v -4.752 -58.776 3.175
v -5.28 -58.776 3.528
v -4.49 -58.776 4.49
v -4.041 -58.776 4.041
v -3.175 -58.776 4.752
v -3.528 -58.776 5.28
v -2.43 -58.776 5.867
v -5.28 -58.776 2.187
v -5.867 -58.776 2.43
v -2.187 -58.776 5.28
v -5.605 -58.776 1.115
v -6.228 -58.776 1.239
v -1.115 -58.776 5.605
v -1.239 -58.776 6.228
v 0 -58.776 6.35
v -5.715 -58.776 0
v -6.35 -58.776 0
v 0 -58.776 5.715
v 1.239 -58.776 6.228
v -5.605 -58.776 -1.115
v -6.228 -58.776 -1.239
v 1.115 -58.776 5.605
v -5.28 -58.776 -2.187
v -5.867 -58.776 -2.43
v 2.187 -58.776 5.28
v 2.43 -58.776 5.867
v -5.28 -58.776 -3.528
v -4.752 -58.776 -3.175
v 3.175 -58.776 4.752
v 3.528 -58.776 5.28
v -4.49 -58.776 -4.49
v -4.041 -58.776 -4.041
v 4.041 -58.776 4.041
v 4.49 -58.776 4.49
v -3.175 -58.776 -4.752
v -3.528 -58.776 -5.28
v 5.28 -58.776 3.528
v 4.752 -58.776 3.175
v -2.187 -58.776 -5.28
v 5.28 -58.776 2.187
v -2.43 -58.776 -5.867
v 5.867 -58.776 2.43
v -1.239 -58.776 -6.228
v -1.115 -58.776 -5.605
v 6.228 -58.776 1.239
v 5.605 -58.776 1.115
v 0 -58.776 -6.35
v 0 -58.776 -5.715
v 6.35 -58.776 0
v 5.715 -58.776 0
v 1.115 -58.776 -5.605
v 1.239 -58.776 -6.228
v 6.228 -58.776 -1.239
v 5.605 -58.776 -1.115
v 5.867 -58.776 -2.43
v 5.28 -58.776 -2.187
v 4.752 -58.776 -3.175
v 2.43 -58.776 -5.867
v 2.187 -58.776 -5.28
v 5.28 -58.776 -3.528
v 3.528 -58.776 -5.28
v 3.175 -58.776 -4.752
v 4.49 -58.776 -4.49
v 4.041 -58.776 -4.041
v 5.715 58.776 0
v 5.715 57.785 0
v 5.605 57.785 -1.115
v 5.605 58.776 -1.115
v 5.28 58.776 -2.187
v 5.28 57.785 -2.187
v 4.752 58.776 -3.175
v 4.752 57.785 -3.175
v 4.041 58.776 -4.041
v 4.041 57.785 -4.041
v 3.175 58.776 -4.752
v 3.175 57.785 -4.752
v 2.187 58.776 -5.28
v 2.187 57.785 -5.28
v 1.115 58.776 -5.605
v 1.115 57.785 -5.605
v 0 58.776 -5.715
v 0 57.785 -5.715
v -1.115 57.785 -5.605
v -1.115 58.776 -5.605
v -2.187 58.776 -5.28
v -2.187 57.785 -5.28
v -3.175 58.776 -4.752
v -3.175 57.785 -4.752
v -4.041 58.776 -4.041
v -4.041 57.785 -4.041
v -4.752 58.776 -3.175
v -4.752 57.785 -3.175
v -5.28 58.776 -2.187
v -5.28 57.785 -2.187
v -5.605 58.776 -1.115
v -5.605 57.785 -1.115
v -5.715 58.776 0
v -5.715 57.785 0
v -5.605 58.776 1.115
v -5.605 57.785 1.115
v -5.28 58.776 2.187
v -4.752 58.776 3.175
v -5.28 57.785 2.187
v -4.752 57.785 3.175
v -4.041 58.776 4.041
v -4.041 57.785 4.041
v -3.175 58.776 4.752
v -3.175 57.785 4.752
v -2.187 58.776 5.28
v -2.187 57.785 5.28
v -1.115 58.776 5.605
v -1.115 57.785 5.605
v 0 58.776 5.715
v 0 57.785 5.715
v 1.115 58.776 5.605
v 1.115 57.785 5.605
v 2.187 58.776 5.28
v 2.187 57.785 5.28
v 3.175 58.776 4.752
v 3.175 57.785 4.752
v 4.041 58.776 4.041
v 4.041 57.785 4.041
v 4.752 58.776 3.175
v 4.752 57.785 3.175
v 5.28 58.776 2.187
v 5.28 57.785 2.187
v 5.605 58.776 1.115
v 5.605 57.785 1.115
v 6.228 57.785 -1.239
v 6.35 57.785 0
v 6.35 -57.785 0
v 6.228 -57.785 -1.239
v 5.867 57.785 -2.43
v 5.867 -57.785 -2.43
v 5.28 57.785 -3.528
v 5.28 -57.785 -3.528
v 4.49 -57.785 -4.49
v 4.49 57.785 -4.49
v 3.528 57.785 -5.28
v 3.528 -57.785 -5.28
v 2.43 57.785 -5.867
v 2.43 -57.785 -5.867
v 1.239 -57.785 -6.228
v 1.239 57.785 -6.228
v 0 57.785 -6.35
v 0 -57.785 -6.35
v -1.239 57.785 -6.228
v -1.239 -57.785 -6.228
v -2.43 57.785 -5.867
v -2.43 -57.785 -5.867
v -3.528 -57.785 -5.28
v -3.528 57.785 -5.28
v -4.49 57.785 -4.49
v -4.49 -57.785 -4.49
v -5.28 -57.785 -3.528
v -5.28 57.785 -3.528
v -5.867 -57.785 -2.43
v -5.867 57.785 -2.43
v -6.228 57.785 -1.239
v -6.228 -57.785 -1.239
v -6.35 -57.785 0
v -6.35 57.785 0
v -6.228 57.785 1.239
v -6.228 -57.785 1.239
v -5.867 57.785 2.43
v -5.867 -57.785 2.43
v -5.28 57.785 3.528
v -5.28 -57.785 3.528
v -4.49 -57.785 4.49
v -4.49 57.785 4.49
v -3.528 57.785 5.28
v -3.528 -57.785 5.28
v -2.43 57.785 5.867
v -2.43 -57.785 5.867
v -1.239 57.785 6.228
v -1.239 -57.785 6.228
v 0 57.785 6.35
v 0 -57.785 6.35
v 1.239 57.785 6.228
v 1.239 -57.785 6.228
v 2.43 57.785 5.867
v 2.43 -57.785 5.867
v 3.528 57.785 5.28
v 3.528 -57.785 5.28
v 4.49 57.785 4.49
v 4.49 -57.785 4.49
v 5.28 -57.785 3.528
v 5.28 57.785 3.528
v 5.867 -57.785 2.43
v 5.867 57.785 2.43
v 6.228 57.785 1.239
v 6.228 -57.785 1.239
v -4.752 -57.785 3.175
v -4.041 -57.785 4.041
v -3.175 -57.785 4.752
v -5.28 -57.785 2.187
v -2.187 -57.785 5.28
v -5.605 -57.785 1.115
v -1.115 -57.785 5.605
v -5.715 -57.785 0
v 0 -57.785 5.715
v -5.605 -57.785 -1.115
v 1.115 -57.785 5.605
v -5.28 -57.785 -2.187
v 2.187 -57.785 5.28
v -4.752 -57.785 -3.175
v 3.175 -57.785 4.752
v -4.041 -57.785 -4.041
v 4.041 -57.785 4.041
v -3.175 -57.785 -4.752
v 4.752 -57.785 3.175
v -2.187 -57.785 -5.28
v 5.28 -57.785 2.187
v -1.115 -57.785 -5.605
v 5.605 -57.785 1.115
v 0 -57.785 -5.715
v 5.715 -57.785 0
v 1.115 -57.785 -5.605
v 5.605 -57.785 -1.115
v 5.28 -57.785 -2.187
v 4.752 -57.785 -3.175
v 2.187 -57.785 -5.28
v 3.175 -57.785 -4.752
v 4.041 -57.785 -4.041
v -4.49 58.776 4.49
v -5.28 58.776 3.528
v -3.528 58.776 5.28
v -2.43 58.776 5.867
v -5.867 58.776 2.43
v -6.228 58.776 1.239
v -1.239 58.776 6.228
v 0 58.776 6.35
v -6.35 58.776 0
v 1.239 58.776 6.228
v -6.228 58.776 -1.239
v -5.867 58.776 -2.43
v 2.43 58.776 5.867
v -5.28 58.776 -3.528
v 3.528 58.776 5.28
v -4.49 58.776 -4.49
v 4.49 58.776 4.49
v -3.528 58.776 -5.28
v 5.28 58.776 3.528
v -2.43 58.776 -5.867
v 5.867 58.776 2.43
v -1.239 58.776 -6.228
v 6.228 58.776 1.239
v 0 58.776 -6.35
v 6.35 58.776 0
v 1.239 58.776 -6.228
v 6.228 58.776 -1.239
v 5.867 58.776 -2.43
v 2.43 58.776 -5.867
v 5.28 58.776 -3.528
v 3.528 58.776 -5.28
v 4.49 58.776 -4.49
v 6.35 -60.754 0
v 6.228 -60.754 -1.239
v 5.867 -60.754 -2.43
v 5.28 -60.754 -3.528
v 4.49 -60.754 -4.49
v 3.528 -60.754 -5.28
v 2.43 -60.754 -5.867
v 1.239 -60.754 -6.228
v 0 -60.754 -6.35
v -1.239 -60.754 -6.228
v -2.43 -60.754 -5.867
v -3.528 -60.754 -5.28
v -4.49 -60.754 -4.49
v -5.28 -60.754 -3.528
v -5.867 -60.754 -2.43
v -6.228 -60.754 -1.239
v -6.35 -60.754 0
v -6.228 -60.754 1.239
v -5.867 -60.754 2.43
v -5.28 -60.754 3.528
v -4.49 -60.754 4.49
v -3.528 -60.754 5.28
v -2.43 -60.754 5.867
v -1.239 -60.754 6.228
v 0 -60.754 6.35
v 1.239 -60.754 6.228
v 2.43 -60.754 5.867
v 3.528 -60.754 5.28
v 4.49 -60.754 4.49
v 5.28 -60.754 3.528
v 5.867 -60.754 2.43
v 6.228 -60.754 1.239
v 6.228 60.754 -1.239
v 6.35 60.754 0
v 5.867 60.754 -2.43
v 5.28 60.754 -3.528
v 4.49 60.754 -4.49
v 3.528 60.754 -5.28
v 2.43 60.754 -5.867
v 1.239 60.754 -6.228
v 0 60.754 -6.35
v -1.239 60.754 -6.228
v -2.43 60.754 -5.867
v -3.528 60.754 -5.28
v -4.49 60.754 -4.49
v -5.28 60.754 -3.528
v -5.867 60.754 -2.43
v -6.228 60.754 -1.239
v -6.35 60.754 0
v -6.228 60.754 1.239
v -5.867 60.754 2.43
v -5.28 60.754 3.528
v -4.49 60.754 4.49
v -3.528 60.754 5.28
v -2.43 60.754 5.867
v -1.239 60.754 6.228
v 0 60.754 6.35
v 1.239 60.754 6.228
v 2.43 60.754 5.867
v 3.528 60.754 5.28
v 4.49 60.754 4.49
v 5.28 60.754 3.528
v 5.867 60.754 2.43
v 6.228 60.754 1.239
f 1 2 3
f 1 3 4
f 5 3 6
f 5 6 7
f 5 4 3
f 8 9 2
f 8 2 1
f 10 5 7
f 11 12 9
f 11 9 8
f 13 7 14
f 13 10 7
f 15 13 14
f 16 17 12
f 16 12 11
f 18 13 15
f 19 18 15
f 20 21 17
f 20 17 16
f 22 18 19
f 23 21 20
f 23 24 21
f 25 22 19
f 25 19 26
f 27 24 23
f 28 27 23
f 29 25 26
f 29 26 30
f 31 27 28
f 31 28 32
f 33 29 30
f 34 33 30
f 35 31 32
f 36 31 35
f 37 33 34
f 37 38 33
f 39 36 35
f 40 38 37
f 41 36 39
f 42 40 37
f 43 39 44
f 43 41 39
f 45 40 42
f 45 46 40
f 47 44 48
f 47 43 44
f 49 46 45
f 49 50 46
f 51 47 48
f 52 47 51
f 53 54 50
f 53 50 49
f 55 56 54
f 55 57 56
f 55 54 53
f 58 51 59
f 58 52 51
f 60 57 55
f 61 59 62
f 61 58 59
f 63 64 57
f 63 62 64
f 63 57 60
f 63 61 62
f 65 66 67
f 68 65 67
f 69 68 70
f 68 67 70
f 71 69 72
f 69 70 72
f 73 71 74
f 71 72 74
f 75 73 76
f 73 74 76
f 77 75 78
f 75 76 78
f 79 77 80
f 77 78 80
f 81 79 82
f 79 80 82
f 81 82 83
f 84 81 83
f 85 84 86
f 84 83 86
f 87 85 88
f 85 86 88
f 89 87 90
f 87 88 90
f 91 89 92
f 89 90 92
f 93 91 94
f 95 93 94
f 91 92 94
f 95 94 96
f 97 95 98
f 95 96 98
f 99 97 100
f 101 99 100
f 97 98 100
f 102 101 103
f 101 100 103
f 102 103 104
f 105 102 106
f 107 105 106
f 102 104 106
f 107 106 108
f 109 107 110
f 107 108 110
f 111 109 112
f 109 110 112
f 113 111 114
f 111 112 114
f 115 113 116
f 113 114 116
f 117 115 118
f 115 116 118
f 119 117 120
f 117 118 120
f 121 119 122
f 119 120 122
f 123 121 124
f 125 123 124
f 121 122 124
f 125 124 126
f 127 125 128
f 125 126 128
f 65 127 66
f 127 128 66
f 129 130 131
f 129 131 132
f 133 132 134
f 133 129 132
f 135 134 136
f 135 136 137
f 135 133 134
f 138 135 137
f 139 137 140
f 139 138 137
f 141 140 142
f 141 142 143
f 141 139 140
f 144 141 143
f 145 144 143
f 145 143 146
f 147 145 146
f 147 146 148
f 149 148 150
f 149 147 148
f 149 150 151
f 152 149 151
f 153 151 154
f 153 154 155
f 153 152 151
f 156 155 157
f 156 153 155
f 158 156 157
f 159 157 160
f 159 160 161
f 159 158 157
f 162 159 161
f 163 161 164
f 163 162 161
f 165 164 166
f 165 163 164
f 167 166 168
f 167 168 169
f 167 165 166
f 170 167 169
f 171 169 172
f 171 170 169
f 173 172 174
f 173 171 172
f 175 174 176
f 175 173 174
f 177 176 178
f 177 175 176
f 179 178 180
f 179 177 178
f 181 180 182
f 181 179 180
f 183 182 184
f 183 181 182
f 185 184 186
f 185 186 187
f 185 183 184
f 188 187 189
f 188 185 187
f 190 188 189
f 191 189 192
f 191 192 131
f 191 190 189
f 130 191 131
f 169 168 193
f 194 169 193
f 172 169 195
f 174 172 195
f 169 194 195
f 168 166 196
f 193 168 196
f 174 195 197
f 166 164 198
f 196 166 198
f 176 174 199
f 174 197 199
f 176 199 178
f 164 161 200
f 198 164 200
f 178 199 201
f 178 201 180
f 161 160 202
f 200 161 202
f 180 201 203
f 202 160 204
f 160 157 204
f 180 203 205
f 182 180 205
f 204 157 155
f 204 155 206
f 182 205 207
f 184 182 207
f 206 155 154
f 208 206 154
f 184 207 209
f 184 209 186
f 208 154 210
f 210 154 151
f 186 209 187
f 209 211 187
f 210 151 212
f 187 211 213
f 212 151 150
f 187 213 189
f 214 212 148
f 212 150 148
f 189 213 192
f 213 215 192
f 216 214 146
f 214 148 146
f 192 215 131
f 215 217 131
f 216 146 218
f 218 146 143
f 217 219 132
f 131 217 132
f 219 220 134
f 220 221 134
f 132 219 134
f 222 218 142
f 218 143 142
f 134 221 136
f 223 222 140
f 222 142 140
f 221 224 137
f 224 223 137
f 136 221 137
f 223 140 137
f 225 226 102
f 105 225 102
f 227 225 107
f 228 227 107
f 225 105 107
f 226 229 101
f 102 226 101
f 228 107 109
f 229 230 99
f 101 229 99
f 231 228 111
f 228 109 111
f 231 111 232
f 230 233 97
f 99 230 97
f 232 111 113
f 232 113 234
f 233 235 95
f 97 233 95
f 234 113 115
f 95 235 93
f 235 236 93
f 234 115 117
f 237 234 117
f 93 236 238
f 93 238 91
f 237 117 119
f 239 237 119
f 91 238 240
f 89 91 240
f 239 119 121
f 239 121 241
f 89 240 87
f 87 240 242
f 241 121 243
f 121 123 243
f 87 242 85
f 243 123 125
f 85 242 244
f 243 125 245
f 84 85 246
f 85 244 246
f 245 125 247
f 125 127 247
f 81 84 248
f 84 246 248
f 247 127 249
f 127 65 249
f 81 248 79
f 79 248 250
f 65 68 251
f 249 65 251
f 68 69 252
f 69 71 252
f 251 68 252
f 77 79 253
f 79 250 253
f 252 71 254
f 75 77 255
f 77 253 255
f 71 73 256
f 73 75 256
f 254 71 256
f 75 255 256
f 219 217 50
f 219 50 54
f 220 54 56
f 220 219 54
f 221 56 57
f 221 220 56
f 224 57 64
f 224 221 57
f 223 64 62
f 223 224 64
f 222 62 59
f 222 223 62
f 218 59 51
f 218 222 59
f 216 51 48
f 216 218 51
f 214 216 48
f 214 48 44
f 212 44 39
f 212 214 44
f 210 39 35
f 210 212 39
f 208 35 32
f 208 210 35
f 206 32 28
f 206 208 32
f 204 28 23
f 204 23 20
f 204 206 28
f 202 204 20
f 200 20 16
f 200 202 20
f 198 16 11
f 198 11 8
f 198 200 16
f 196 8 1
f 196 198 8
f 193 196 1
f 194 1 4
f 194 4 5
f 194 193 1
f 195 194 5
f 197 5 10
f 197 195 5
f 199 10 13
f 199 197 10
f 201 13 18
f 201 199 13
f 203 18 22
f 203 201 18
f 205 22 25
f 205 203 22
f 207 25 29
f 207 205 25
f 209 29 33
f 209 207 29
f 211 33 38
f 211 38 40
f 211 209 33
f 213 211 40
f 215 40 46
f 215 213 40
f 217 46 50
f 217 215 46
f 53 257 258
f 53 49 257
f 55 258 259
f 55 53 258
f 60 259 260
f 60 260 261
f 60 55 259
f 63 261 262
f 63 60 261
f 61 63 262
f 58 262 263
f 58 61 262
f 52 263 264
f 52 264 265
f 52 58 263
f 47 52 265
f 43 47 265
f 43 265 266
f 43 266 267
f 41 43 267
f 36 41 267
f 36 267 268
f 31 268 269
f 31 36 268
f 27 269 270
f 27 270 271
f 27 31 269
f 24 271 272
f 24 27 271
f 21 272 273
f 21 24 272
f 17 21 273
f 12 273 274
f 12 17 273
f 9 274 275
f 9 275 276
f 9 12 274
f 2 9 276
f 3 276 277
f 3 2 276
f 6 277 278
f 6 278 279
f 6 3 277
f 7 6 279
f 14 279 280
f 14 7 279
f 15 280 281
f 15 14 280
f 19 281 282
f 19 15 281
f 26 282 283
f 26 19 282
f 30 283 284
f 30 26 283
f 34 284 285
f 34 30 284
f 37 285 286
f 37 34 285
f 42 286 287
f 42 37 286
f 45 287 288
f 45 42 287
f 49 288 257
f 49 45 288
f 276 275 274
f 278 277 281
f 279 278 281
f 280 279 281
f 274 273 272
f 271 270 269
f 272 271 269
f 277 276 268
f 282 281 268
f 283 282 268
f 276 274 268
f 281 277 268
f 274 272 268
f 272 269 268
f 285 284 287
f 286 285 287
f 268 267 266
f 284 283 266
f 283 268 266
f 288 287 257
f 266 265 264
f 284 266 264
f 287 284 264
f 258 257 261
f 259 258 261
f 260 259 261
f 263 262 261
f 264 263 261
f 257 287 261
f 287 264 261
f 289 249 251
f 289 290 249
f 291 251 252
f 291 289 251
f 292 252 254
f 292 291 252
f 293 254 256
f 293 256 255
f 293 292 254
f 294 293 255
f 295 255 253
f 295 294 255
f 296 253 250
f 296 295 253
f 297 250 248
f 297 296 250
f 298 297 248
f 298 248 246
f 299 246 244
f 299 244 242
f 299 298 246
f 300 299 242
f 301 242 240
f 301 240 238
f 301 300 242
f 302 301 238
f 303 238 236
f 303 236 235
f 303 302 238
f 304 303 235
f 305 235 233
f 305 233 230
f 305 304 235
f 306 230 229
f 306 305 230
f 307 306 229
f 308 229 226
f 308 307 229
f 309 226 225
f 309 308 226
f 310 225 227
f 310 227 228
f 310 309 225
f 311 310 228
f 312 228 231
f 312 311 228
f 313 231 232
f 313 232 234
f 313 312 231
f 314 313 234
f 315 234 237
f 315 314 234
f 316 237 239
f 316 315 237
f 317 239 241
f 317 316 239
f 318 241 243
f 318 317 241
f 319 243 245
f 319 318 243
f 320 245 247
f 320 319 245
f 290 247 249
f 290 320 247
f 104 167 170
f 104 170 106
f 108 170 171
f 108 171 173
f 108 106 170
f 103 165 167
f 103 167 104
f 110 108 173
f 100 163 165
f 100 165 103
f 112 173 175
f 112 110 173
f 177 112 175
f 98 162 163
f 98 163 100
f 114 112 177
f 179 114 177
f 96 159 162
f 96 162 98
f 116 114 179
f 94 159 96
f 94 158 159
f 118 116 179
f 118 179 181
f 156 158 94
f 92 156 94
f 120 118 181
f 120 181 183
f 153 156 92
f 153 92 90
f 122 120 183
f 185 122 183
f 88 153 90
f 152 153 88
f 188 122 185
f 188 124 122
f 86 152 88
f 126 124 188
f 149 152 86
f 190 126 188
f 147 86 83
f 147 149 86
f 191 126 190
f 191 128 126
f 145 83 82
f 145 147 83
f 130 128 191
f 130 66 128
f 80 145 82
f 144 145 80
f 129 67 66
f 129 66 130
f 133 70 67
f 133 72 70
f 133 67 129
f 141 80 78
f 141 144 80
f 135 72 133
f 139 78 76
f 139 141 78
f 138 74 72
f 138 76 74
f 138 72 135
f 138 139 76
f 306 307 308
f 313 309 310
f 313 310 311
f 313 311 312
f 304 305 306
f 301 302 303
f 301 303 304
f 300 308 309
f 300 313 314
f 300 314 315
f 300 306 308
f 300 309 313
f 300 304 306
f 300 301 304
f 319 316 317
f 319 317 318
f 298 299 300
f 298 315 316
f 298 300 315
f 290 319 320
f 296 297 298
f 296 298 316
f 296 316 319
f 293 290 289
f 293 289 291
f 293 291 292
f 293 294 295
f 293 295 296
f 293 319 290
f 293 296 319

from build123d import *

# Parameters (mm, degrees)
SKETCH1_R           = 6.35
SKETCH1_R_2         = 3.175
BOSS_EXTRUDE1_DEPTH = 59.69
CUT_EXTRUDE1_START  = 1.905
SKETCH2_R           = 6.35
SKETCH2_R_2         = 5.715
CUT_EXTRUDE1_DEPTH  = 0.9906
SKETCH3_R           = 6.35
BOSS_EXTRUDE2_DEPTH = 1.064499902


with BuildPart() as part:
    # Sketch1 → Boss-Extrude1 (new body, symmetric)
    with BuildSketch(Plane(origin=(0, 0, 0), x_dir=(1, 0, 0), z_dir=(0, 1, 0))):
        Circle(SKETCH1_R)
        Circle(SKETCH1_R_2, mode=Mode.SUBTRACT)
        Circle(SKETCH1_R_2)
    extrude(amount=BOSS_EXTRUDE1_DEPTH, both=True)

    # Sketch2 → Cut-Extrude1 (cut)
    with BuildSketch(Plane(origin=(0, -59.69, 0), x_dir=(1, 0, 0), z_dir=(0, 1, 0)).offset(CUT_EXTRUDE1_START)):
        Circle(SKETCH2_R)
        Circle(SKETCH2_R_2, mode=Mode.SUBTRACT)
    cut_extrude1 = extrude(amount=-CUT_EXTRUDE1_DEPTH, mode=Mode.SUBTRACT)

    # Mirror1: Cut-Extrude1 across plane
    add(cut_extrude1.mirror(Plane.ZX), mode=Mode.SUBTRACT)

    # Sketch3 → Boss-Extrude2 (add)
    with BuildSketch(Plane(origin=(0, 59.69, 0), x_dir=(1, 0, 0), z_dir=(0, 1, 0))):
        Circle(SKETCH3_R)
    boss_extrude2 = extrude(amount=BOSS_EXTRUDE2_DEPTH)

    # Mirror2: Boss-Extrude2 across plane
    add(boss_extrude2.mirror(Plane.ZX))


solid = part.part
